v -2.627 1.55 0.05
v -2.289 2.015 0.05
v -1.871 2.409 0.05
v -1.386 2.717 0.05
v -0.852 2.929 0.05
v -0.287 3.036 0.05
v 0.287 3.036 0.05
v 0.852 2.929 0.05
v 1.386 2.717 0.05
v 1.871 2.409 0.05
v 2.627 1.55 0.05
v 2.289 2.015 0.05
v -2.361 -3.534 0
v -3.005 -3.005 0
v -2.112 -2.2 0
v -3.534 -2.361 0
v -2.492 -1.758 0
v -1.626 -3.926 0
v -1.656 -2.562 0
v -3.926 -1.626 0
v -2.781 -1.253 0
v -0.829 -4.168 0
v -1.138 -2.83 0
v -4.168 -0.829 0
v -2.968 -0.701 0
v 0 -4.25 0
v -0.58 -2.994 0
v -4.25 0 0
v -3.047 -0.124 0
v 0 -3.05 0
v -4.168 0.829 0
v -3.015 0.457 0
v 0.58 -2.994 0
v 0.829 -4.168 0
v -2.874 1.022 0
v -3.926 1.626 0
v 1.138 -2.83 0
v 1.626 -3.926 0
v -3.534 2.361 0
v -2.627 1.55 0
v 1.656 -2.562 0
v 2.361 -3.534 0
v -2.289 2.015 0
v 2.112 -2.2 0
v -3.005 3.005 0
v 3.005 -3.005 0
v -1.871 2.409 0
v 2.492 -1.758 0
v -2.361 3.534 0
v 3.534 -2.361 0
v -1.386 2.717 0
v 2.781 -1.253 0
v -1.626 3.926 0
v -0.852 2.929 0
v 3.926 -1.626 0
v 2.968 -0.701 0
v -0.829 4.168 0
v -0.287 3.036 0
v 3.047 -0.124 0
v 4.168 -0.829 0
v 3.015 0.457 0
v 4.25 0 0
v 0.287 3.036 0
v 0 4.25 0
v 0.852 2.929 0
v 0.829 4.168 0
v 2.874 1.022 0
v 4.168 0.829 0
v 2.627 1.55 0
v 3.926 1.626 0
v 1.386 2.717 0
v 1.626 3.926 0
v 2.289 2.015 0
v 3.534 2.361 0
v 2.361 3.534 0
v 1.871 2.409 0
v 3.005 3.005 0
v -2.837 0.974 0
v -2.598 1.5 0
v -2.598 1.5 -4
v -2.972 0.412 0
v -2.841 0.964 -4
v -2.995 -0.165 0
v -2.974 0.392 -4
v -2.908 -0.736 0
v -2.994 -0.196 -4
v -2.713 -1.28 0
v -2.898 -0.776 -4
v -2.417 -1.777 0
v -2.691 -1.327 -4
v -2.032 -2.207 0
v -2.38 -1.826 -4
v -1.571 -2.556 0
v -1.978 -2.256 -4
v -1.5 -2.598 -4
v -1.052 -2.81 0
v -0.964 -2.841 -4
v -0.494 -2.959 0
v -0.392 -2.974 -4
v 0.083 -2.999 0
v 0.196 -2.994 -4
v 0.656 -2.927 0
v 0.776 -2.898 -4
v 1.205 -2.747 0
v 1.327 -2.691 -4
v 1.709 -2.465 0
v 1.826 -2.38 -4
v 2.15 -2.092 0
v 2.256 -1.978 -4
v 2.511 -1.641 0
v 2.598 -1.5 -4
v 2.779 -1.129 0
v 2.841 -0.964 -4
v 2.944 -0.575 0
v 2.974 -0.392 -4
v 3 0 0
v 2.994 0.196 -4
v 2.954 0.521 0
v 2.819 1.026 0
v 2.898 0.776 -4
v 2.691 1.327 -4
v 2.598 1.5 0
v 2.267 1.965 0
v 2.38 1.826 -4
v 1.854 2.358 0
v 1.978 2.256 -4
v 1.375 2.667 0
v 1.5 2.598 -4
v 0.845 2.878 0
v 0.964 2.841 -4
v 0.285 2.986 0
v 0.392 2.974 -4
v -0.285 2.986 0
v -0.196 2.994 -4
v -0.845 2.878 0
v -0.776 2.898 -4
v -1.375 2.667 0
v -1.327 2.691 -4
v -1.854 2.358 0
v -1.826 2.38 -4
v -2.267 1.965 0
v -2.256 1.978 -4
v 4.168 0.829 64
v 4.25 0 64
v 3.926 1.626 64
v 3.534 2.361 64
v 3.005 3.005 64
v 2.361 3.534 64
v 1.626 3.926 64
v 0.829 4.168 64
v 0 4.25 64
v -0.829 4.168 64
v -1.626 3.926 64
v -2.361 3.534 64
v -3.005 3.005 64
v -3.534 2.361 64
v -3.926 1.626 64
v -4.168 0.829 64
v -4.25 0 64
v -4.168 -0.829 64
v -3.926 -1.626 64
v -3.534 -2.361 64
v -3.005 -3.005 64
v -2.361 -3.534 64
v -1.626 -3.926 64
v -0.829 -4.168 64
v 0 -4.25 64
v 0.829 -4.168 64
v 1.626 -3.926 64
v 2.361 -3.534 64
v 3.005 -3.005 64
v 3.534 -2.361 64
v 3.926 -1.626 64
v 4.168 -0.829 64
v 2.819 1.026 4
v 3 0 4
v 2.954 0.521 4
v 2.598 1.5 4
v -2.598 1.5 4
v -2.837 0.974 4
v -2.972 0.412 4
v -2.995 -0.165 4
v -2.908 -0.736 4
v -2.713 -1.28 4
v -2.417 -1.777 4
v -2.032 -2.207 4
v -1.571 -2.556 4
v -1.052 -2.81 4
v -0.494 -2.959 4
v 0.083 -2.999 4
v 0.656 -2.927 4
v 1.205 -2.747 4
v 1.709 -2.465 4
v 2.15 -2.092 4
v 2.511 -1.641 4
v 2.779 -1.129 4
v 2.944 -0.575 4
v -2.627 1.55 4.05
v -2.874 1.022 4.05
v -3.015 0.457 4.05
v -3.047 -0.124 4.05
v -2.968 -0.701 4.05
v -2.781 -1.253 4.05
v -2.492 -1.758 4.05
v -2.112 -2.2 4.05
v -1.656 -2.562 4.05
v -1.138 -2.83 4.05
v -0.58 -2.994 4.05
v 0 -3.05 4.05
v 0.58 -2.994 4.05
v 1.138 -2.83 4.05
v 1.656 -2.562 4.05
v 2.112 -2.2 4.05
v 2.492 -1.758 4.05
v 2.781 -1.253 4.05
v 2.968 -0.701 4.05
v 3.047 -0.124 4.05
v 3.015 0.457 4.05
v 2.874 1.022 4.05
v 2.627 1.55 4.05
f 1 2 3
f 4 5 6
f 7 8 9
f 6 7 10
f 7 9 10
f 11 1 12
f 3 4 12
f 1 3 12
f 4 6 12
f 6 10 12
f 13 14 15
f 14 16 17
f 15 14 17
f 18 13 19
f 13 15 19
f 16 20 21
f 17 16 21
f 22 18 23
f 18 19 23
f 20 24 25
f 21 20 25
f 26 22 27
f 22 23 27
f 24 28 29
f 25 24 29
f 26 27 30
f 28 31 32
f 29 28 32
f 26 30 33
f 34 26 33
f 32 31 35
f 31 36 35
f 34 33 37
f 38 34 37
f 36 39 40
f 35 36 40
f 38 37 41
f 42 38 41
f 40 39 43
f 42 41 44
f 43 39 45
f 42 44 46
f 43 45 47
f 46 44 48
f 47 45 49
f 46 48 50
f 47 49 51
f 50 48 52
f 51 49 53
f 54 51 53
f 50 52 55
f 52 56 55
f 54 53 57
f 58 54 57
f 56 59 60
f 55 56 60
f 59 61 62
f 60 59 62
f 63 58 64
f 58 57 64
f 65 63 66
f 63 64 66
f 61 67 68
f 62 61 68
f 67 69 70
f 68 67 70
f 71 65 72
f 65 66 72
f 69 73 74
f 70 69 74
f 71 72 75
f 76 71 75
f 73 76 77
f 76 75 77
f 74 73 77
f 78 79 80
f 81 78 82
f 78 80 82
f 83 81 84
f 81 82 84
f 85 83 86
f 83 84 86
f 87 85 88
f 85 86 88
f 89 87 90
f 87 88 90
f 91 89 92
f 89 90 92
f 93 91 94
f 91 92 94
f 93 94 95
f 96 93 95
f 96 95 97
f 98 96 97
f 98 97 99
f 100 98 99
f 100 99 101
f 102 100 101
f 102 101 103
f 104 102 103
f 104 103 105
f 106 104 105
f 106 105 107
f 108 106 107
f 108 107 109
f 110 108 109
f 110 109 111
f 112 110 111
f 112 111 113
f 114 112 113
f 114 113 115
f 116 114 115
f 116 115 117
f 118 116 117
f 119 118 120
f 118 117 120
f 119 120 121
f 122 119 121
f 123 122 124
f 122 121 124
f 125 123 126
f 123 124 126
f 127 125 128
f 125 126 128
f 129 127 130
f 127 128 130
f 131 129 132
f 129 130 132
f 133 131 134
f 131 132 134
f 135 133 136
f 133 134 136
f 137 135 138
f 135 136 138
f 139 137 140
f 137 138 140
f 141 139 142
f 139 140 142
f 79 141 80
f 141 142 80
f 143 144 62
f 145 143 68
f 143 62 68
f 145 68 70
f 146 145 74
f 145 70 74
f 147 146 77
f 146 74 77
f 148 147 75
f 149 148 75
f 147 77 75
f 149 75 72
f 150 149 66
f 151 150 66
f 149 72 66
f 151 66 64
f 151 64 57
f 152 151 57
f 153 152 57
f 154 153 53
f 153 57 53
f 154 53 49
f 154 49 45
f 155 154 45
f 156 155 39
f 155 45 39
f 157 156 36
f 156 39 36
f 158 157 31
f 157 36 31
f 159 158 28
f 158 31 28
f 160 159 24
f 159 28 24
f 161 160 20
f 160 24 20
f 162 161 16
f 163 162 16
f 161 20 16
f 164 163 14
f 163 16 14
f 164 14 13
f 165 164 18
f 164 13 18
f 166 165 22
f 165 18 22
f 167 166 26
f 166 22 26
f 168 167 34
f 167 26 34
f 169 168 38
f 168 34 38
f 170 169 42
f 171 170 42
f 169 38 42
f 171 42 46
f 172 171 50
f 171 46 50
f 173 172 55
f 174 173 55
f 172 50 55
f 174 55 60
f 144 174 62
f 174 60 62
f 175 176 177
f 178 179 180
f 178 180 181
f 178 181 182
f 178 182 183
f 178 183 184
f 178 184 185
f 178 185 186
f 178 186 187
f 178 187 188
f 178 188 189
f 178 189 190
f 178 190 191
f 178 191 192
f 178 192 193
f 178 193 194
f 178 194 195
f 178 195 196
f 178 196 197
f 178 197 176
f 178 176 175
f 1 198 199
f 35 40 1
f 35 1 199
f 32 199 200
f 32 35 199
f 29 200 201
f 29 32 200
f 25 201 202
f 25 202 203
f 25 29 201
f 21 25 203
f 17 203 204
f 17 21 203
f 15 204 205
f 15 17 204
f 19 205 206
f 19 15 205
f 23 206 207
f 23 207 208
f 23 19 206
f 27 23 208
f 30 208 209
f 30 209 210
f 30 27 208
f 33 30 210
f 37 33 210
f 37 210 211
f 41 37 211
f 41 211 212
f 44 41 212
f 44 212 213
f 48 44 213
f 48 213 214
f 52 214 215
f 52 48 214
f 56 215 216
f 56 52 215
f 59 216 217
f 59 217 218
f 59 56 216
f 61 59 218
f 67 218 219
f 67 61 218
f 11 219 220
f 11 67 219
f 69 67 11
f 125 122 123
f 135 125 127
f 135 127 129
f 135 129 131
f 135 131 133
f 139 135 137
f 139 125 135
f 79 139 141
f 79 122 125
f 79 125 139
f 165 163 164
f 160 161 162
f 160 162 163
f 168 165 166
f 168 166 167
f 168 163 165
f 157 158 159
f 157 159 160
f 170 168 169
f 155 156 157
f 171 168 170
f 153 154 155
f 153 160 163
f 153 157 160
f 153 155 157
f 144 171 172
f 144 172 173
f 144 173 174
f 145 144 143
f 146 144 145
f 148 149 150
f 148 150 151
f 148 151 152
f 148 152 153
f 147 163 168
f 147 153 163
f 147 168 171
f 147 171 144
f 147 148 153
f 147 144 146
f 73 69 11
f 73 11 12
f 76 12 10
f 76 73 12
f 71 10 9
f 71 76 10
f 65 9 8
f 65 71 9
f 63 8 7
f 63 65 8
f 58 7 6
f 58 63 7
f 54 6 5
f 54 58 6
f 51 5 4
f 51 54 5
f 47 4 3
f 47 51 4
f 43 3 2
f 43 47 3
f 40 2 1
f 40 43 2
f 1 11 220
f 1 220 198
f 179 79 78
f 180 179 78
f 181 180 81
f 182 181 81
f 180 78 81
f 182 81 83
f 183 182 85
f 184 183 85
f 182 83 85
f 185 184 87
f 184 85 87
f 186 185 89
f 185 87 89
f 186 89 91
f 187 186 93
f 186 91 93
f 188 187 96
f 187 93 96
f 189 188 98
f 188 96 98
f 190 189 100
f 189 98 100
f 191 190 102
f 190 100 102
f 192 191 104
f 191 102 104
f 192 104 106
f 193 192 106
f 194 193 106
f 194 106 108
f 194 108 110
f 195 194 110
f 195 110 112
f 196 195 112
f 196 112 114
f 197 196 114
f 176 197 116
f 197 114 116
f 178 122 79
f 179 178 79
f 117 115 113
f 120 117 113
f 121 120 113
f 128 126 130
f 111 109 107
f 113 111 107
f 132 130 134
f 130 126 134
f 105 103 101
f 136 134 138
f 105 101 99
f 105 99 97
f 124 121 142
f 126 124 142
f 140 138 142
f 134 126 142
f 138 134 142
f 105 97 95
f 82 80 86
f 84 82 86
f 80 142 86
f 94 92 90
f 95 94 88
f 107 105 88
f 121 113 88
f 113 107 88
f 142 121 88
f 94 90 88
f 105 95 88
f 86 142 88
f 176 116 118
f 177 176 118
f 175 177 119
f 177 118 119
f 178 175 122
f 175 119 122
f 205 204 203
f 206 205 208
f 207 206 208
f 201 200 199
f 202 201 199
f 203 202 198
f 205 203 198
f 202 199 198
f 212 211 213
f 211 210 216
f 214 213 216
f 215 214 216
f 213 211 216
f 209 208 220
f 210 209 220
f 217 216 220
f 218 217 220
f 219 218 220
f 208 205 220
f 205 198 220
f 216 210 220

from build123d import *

# Parameters (mm, degrees)
EXTRUDE_1_DEPTH      = 4
EXTRUDE_START        = -4
SKETCH_1_3_R         = 3
EXTRUDE_2_DEPTH      = 4
EXTRUDE_5_DEPTH      = 60
EXTRUDE_5_DEPTH_BACK = 4
SKETCH_2_R           = 4.25
OTHER_2_DEPTH        = 4.05
OTHER_2_2_DEPTH      = 0.05


# Read off the part's stored shape, not the designer's step: 压凹2
with BuildPart() as part:
    # 草图1 → 凸台-拉伸1 (new body)
    with BuildSketch(Plane.XY):
        with BuildLine():
            Line((2.598076211, 1.5), (-2.598076211, 1.5))
            ThreePointArc((-2.598076211, 1.5), (-0.776457135, -2.897777479), (3, 0))
            ThreePointArc((3, 0), (2.897777479, 0.776457135), (2.598076211, 1.5))
        make_face()
    extrude(amount=EXTRUDE_1_DEPTH)

    # 草图1<3> → 凸台-拉伸2 (add)
    with BuildSketch(Plane.XY.offset(EXTRUDE_START)):
        with Locations(Location((0, 0, 0), (0, 0, 150))):
            Circle(SKETCH_1_3_R)
    extrude(amount=EXTRUDE_2_DEPTH)


with BuildPart() as body_2:
    # 草图2 → 凸台-拉伸5 (new, two sides: drawn at the far end of the back side and taken through both)
    with BuildSketch(Plane.XY.offset(4).offset(-EXTRUDE_5_DEPTH_BACK)):
        Circle(SKETCH_2_R)
    extrude(amount=EXTRUDE_5_DEPTH + EXTRUDE_5_DEPTH_BACK)

    # 压凹2 outline → 压凹2 (cut)
    with BuildSketch(Plane.XY):
        with BuildLine():
            ThreePointArc((-2.626785107, 1.55), (0, -3.05), (2.626785107, 1.55))
            Line((2.626785107, 1.55), (-2.626785107, 1.55))
        make_face()
    extrude(amount=OTHER_2_DEPTH, mode=Mode.SUBTRACT)

    # Other 2 2 outline → Other 2 2 (cut)
    with BuildSketch(Plane.XY):
        with BuildLine():
            Line((-2.626785107, 1.55), (2.626785107, 1.55))
            ThreePointArc((2.626785107, 1.55), (0, 3.05), (-2.626785107, 1.55))
        make_face()
    extrude(amount=OTHER_2_2_DEPTH, mode=Mode.SUBTRACT)


solid = Compound([part.part, body_2.part])
